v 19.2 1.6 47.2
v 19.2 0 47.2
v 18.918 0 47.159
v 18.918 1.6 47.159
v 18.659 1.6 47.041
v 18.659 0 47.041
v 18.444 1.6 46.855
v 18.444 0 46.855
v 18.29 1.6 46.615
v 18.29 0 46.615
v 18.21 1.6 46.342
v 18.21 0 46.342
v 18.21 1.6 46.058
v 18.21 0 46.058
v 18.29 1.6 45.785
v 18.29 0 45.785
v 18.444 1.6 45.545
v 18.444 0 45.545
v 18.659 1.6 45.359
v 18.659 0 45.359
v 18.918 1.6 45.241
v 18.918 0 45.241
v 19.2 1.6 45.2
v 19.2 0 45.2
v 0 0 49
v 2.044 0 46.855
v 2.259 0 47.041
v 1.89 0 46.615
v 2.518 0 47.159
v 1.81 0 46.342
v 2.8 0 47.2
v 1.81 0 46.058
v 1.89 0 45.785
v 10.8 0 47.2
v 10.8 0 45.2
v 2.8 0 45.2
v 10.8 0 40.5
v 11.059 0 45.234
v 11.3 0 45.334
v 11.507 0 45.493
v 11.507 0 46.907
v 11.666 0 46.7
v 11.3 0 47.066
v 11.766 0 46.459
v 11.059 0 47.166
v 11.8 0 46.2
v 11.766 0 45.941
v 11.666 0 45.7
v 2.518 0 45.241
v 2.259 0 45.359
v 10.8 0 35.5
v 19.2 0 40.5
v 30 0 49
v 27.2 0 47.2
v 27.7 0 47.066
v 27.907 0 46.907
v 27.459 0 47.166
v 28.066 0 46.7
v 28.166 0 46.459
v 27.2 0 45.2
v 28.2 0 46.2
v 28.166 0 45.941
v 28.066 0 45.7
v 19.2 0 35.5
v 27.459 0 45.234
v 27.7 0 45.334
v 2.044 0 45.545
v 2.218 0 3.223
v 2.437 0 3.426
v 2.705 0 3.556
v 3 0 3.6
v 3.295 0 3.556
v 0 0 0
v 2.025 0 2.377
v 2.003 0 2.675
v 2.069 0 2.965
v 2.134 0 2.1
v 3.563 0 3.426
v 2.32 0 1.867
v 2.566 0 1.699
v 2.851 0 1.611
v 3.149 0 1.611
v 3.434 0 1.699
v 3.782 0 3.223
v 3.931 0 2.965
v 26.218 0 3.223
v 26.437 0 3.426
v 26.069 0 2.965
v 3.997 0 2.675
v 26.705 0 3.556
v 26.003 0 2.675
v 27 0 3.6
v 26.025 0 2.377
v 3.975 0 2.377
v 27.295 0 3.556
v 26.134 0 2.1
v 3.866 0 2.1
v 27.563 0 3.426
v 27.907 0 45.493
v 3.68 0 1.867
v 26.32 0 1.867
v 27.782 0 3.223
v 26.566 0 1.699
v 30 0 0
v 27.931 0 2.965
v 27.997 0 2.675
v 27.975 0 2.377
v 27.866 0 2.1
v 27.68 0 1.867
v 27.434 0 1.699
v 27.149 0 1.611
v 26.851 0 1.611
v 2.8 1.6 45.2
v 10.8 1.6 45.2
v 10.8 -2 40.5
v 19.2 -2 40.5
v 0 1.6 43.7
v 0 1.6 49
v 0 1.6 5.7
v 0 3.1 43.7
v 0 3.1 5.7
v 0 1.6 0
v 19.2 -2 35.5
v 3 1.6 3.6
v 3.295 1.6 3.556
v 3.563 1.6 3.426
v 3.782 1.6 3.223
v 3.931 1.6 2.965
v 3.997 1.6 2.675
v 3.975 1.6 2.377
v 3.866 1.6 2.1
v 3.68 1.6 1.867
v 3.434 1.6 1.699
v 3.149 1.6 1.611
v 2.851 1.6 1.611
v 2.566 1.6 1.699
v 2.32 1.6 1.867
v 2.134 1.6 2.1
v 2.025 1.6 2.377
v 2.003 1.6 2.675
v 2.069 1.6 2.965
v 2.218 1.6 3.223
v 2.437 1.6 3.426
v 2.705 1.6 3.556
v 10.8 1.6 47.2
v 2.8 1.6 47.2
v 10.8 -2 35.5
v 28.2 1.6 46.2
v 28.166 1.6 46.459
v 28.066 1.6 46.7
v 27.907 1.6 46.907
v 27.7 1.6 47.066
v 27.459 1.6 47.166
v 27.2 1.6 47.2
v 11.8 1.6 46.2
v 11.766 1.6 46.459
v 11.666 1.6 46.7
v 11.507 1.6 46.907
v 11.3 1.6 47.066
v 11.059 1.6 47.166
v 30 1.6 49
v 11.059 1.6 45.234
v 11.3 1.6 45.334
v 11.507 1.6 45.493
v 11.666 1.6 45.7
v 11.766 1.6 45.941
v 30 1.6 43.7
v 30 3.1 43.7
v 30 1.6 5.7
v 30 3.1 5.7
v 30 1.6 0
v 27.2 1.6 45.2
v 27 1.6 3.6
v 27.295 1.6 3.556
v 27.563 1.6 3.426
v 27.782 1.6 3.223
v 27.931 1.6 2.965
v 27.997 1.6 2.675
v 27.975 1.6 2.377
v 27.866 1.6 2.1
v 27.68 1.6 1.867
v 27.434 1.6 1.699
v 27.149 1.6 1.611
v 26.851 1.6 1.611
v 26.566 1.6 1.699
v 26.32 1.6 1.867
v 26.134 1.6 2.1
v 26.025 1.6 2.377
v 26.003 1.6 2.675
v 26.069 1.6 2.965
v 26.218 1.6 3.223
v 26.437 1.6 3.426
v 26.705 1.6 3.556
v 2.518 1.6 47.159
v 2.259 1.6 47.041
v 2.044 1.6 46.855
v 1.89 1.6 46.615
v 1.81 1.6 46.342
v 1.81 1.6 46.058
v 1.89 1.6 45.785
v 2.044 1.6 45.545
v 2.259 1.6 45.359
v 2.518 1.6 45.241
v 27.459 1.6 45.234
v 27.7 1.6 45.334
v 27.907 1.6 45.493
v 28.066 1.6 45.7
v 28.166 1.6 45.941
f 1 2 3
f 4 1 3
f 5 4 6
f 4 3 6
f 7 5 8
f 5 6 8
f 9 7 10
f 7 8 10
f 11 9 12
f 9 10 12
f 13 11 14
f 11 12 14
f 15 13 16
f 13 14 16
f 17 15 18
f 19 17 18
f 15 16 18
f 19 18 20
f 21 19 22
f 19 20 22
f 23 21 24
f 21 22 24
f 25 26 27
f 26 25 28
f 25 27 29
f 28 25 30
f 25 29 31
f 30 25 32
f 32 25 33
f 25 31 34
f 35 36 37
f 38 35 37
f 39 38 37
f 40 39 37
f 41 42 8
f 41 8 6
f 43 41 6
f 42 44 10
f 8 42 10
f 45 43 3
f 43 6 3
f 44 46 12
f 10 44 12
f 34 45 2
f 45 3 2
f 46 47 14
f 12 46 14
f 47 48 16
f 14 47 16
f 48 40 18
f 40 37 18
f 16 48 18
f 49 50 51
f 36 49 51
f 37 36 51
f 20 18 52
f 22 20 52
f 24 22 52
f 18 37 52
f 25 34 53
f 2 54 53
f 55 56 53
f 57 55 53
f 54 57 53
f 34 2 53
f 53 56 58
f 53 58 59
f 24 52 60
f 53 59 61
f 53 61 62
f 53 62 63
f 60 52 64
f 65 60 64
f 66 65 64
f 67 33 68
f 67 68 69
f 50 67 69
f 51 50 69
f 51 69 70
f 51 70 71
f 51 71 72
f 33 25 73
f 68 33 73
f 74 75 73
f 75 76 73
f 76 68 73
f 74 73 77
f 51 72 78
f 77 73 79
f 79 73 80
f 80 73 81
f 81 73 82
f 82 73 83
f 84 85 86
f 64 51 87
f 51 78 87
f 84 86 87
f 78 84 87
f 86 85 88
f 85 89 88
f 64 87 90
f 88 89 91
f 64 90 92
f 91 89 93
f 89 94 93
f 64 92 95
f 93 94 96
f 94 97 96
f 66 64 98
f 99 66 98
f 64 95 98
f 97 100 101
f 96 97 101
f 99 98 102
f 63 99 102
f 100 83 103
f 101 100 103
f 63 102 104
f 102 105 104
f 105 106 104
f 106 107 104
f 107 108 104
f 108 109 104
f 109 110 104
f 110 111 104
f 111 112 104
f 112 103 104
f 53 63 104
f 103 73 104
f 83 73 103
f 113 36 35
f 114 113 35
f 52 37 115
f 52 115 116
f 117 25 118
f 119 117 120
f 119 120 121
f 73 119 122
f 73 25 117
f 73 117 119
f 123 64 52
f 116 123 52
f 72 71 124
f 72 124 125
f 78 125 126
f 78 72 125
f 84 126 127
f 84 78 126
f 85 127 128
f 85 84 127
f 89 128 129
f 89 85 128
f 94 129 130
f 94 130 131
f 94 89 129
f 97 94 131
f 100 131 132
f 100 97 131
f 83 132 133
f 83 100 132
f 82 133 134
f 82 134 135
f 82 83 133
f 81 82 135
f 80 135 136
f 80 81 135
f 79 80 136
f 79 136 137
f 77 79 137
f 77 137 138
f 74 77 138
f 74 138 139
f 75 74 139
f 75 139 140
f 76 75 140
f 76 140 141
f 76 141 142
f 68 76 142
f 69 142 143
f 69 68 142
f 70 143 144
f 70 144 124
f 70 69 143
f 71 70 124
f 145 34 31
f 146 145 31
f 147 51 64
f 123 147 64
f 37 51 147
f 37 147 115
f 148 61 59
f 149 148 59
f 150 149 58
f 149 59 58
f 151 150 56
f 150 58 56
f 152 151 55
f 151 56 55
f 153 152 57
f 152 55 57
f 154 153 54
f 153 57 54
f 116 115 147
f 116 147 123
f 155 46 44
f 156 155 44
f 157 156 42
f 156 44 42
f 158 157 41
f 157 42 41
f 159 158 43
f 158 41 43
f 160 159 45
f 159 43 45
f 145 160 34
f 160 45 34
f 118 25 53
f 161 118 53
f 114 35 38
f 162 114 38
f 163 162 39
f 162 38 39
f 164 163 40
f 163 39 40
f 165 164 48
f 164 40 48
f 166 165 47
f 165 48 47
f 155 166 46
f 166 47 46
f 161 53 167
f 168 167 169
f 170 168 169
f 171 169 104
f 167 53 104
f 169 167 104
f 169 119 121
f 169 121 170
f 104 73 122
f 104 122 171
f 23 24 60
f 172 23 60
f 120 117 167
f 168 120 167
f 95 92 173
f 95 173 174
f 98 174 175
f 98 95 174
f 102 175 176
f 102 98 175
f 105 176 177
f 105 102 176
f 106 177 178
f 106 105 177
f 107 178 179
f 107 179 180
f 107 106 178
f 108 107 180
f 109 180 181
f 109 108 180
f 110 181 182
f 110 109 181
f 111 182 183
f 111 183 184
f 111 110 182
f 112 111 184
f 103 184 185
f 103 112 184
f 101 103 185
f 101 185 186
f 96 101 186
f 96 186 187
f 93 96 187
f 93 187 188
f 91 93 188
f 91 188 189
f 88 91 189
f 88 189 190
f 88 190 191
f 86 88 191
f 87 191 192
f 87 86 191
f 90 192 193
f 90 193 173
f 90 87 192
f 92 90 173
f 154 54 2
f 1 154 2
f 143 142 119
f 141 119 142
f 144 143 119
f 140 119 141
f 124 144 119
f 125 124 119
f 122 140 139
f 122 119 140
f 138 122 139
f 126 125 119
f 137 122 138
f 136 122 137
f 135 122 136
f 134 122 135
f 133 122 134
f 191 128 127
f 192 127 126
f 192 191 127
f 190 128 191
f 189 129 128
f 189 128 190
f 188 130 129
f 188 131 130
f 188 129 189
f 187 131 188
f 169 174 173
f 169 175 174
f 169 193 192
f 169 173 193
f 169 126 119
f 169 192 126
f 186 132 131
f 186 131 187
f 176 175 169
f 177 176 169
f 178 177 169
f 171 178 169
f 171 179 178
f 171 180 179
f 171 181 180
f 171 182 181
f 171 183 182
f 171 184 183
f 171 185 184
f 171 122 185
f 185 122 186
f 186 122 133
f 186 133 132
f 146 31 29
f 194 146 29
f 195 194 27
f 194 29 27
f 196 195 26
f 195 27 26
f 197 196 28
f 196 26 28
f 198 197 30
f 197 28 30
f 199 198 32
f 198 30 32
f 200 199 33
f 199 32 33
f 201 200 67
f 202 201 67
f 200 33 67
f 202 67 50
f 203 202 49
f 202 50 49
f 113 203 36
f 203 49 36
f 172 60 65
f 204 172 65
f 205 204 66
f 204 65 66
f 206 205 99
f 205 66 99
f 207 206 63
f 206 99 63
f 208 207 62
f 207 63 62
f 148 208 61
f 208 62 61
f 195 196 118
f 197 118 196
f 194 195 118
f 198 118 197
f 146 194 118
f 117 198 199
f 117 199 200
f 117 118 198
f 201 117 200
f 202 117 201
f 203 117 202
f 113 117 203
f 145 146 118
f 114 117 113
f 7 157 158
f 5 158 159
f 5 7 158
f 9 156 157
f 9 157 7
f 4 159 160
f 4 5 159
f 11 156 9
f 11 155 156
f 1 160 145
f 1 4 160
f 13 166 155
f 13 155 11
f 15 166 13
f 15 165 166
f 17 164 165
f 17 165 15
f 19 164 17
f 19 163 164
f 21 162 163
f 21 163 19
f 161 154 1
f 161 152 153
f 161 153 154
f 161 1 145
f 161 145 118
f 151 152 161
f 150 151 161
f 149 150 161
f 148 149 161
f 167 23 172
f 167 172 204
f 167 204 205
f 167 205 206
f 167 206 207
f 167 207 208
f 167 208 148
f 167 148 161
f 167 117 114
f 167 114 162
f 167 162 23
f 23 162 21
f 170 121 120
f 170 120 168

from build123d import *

# Parameters (mm, degrees)
SKETCH_1_W      = 30
SKETCH_1_H      = 49
SKETCH_1_R      = 1
EXTRUDE_1_DEPTH = 1.6
SKETCH_2_W      = 30
SKETCH_2_H      = 38
EXTRUDE_2_DEPTH = 1.5
SKETCH_3_W      = 8.4
SKETCH_3_H      = 5
EXTRUDE_3_DEPTH = 2


with BuildPart() as part:
    # 草图1 → 凸台-拉伸1 (new body)
    with BuildSketch(Plane(origin=(0, 0, 0), x_dir=(1, 0, 0), z_dir=(0, 1, 0))):
        with Locations((15, -24.5)):
            Rectangle(SKETCH_1_W, SKETCH_1_H)
        with BuildLine():
            ThreePointArc((2.8, -47.2), (1.8, -46.2), (2.8, -45.2))
            Line((2.8, -45.2), (10.8, -45.2))
            ThreePointArc((10.8, -45.2), (11.507106781, -45.492893219), (11.8, -46.2))
            ThreePointArc((11.8, -46.2), (11.507106781, -46.907106781), (10.8, -47.2))
            Line((10.8, -47.2), (2.8, -47.2))
        make_face(mode=Mode.SUBTRACT)
        with BuildLine():
            ThreePointArc((19.2, -47.2), (18.2, -46.2), (19.2, -45.2))
            Line((19.2, -45.2), (27.2, -45.2))
            ThreePointArc((27.2, -45.2), (27.907106781, -45.492893219), (28.2, -46.2))
            ThreePointArc((28.2, -46.2), (27.907106781, -46.907106781), (27.2, -47.2))
            Line((27.2, -47.2), (19.2, -47.2))
        make_face(mode=Mode.SUBTRACT)
        with Locations(Location((3, -2.6, 0), (0, 0, 270))):
            Circle(SKETCH_1_R, mode=Mode.SUBTRACT)
        with Locations(Location((27, -2.6, 0), (0, 0, 270))):
            Circle(SKETCH_1_R, mode=Mode.SUBTRACT)
    extrude(amount=EXTRUDE_1_DEPTH)

    # 草图2 → 凸台-拉伸2 (add)
    with BuildSketch(Plane(origin=(0, 1.6, 0), x_dir=(1, 0, 0), z_dir=(0, 1, 0))):
        with Locations((15, -24.7)):
            Rectangle(SKETCH_2_W, SKETCH_2_H)
    extrude(amount=EXTRUDE_2_DEPTH)

    # 草图3 → 凸台-拉伸3 (add)
    with BuildSketch(Plane.XZ):
        with Locations((15, 38)):
            Rectangle(SKETCH_3_W, SKETCH_3_H)
    extrude(amount=EXTRUDE_3_DEPTH)


solid = part.part
